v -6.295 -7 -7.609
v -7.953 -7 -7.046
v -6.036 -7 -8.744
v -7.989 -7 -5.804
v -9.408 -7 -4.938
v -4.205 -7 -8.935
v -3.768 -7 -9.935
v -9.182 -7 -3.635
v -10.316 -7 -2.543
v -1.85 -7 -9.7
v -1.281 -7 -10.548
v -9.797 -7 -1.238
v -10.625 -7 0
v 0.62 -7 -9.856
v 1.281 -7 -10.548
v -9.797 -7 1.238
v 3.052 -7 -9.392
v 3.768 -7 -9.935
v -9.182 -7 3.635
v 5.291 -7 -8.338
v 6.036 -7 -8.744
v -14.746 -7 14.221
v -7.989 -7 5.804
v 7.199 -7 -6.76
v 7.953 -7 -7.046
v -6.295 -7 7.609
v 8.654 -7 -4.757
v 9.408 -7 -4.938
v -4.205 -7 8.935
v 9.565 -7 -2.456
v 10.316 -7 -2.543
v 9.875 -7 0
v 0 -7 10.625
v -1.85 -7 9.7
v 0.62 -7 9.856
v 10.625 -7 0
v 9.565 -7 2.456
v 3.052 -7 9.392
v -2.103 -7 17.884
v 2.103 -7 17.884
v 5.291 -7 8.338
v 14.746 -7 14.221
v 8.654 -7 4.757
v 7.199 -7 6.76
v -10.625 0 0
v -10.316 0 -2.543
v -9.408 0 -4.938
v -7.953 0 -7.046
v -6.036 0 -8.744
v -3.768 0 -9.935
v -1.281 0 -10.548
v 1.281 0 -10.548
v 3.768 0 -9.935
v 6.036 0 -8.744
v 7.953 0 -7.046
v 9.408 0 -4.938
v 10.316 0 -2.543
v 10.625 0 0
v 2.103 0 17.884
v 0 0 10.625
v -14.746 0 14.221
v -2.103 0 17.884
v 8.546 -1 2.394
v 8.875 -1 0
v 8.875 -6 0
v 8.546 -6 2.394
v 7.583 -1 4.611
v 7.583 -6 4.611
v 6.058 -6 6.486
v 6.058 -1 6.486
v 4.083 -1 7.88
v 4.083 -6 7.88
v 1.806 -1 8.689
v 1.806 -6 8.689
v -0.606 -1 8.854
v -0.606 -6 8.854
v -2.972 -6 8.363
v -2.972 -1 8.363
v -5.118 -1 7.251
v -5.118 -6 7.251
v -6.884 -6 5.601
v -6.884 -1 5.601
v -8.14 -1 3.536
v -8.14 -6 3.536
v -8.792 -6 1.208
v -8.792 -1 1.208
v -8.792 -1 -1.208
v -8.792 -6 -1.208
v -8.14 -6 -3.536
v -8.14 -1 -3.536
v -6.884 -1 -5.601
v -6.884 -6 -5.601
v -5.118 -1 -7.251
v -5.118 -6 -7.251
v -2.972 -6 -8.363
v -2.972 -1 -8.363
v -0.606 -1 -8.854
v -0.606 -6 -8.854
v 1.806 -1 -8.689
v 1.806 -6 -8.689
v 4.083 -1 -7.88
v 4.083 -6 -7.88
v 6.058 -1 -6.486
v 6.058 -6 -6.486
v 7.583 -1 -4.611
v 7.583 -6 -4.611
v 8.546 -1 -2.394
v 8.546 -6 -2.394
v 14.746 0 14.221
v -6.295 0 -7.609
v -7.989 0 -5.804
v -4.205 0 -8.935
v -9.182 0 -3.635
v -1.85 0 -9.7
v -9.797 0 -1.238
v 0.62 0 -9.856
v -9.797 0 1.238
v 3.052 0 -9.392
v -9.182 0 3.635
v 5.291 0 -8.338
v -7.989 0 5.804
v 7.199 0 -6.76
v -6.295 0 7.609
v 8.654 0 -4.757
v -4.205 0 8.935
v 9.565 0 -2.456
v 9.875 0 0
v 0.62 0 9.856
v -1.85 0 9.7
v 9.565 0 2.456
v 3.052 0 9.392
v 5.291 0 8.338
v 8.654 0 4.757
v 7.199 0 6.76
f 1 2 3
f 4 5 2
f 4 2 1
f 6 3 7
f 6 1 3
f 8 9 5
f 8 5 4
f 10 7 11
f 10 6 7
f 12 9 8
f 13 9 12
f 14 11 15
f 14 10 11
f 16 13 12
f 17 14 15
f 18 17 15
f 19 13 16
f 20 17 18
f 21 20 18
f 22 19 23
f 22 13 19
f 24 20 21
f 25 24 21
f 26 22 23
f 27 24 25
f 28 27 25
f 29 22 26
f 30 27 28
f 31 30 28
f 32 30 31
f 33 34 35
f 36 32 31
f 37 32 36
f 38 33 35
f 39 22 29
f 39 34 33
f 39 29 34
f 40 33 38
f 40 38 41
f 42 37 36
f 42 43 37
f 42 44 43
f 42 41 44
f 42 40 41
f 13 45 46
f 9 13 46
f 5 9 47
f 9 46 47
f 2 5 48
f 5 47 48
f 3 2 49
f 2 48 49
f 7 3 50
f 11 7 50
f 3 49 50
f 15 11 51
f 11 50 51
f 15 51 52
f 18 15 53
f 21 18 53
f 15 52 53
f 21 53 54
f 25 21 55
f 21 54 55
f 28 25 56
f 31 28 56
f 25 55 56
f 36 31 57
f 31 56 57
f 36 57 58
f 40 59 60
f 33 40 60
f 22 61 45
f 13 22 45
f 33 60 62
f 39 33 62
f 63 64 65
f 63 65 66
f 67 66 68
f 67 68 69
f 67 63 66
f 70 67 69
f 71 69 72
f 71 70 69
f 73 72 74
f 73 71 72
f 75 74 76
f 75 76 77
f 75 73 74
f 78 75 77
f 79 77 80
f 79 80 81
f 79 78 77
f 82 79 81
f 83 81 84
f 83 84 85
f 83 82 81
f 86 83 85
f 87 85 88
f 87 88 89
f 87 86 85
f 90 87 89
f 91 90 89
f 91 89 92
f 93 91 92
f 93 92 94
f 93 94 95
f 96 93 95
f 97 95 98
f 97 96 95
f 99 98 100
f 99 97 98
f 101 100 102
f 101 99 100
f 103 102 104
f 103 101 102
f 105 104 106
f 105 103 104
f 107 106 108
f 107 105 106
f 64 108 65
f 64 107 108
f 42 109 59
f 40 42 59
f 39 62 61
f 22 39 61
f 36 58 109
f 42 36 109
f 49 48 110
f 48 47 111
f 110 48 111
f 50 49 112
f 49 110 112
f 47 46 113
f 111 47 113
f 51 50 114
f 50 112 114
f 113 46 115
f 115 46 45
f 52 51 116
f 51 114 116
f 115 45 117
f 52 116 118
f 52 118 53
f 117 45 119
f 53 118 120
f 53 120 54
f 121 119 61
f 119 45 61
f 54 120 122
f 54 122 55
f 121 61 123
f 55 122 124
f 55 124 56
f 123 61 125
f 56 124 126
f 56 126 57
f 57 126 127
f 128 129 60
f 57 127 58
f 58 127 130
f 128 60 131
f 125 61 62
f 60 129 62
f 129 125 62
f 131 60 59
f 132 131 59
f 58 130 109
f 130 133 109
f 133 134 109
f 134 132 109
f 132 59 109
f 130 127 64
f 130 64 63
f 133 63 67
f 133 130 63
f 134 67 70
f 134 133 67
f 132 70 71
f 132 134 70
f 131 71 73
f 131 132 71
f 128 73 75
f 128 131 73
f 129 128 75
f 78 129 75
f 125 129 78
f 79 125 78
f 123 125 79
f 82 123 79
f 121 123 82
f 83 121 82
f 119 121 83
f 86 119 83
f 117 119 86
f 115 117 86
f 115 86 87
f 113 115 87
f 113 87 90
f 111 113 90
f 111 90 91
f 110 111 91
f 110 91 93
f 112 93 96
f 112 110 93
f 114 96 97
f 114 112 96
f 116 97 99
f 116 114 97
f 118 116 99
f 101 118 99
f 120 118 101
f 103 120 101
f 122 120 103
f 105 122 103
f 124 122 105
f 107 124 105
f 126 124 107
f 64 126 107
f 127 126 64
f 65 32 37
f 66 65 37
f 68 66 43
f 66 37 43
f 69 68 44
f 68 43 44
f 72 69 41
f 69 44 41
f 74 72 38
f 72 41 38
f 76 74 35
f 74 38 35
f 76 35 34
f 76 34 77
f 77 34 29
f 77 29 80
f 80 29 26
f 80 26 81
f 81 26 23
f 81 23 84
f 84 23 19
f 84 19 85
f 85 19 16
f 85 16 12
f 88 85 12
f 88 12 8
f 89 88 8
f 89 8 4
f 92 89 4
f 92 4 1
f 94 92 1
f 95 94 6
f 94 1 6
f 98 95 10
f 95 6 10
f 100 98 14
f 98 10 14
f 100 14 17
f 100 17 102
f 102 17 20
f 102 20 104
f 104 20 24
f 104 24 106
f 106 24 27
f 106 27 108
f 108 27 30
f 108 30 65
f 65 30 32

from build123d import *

# Parameters (mm, degrees)
F0_R     = 8.875
F1_DEPTH = 7
F2_SIZE  = 1


with BuildPart() as f1:
    # F0 (on Front) → F1 (new body)
    with BuildSketch(Plane.XZ):
        with BuildLine():
            ThreePointArc((0, 10.625), (7.51301, 7.51301), (10.625, 0))
            Line((10.625, 0), (14.745765, 14.220767))
            Line((14.745765, 14.220767), (2.103486, 17.884132))
            Line((2.103486, 17.884132), (0, 10.625))
        make_face()
        with BuildLine():
            ThreePointArc((-10.625, 0), (-7.51301, 7.51301), (0, 10.625))
            Line((0, 10.625), (-2.103486, 17.884132))
            Line((-2.103486, 17.884132), (-14.745765, 14.220767))
            Line((-14.745765, 14.220767), (-10.625, 0))
        make_face()
        with BuildLine():
            ThreePointArc((-10.625, 0), (0, -10.625), (10.625, 0))
            ThreePointArc((10.625, 0), (7.51301, 7.51301), (0, 10.625))
            ThreePointArc((0, 10.625), (-7.51301, 7.51301), (-10.625, 0))
        make_face()
        Circle(F0_R, mode=Mode.SUBTRACT)
    extrude(amount=F1_DEPTH)

    # F2
    f2_edges = [f1.edges().sort_by_distance(p)[0] for p in [
        (-8.875, 0, 0),
        (-8.875, -7, 0),
    ]]
    chamfer(f2_edges, length=F2_SIZE)


solid = f1.part
